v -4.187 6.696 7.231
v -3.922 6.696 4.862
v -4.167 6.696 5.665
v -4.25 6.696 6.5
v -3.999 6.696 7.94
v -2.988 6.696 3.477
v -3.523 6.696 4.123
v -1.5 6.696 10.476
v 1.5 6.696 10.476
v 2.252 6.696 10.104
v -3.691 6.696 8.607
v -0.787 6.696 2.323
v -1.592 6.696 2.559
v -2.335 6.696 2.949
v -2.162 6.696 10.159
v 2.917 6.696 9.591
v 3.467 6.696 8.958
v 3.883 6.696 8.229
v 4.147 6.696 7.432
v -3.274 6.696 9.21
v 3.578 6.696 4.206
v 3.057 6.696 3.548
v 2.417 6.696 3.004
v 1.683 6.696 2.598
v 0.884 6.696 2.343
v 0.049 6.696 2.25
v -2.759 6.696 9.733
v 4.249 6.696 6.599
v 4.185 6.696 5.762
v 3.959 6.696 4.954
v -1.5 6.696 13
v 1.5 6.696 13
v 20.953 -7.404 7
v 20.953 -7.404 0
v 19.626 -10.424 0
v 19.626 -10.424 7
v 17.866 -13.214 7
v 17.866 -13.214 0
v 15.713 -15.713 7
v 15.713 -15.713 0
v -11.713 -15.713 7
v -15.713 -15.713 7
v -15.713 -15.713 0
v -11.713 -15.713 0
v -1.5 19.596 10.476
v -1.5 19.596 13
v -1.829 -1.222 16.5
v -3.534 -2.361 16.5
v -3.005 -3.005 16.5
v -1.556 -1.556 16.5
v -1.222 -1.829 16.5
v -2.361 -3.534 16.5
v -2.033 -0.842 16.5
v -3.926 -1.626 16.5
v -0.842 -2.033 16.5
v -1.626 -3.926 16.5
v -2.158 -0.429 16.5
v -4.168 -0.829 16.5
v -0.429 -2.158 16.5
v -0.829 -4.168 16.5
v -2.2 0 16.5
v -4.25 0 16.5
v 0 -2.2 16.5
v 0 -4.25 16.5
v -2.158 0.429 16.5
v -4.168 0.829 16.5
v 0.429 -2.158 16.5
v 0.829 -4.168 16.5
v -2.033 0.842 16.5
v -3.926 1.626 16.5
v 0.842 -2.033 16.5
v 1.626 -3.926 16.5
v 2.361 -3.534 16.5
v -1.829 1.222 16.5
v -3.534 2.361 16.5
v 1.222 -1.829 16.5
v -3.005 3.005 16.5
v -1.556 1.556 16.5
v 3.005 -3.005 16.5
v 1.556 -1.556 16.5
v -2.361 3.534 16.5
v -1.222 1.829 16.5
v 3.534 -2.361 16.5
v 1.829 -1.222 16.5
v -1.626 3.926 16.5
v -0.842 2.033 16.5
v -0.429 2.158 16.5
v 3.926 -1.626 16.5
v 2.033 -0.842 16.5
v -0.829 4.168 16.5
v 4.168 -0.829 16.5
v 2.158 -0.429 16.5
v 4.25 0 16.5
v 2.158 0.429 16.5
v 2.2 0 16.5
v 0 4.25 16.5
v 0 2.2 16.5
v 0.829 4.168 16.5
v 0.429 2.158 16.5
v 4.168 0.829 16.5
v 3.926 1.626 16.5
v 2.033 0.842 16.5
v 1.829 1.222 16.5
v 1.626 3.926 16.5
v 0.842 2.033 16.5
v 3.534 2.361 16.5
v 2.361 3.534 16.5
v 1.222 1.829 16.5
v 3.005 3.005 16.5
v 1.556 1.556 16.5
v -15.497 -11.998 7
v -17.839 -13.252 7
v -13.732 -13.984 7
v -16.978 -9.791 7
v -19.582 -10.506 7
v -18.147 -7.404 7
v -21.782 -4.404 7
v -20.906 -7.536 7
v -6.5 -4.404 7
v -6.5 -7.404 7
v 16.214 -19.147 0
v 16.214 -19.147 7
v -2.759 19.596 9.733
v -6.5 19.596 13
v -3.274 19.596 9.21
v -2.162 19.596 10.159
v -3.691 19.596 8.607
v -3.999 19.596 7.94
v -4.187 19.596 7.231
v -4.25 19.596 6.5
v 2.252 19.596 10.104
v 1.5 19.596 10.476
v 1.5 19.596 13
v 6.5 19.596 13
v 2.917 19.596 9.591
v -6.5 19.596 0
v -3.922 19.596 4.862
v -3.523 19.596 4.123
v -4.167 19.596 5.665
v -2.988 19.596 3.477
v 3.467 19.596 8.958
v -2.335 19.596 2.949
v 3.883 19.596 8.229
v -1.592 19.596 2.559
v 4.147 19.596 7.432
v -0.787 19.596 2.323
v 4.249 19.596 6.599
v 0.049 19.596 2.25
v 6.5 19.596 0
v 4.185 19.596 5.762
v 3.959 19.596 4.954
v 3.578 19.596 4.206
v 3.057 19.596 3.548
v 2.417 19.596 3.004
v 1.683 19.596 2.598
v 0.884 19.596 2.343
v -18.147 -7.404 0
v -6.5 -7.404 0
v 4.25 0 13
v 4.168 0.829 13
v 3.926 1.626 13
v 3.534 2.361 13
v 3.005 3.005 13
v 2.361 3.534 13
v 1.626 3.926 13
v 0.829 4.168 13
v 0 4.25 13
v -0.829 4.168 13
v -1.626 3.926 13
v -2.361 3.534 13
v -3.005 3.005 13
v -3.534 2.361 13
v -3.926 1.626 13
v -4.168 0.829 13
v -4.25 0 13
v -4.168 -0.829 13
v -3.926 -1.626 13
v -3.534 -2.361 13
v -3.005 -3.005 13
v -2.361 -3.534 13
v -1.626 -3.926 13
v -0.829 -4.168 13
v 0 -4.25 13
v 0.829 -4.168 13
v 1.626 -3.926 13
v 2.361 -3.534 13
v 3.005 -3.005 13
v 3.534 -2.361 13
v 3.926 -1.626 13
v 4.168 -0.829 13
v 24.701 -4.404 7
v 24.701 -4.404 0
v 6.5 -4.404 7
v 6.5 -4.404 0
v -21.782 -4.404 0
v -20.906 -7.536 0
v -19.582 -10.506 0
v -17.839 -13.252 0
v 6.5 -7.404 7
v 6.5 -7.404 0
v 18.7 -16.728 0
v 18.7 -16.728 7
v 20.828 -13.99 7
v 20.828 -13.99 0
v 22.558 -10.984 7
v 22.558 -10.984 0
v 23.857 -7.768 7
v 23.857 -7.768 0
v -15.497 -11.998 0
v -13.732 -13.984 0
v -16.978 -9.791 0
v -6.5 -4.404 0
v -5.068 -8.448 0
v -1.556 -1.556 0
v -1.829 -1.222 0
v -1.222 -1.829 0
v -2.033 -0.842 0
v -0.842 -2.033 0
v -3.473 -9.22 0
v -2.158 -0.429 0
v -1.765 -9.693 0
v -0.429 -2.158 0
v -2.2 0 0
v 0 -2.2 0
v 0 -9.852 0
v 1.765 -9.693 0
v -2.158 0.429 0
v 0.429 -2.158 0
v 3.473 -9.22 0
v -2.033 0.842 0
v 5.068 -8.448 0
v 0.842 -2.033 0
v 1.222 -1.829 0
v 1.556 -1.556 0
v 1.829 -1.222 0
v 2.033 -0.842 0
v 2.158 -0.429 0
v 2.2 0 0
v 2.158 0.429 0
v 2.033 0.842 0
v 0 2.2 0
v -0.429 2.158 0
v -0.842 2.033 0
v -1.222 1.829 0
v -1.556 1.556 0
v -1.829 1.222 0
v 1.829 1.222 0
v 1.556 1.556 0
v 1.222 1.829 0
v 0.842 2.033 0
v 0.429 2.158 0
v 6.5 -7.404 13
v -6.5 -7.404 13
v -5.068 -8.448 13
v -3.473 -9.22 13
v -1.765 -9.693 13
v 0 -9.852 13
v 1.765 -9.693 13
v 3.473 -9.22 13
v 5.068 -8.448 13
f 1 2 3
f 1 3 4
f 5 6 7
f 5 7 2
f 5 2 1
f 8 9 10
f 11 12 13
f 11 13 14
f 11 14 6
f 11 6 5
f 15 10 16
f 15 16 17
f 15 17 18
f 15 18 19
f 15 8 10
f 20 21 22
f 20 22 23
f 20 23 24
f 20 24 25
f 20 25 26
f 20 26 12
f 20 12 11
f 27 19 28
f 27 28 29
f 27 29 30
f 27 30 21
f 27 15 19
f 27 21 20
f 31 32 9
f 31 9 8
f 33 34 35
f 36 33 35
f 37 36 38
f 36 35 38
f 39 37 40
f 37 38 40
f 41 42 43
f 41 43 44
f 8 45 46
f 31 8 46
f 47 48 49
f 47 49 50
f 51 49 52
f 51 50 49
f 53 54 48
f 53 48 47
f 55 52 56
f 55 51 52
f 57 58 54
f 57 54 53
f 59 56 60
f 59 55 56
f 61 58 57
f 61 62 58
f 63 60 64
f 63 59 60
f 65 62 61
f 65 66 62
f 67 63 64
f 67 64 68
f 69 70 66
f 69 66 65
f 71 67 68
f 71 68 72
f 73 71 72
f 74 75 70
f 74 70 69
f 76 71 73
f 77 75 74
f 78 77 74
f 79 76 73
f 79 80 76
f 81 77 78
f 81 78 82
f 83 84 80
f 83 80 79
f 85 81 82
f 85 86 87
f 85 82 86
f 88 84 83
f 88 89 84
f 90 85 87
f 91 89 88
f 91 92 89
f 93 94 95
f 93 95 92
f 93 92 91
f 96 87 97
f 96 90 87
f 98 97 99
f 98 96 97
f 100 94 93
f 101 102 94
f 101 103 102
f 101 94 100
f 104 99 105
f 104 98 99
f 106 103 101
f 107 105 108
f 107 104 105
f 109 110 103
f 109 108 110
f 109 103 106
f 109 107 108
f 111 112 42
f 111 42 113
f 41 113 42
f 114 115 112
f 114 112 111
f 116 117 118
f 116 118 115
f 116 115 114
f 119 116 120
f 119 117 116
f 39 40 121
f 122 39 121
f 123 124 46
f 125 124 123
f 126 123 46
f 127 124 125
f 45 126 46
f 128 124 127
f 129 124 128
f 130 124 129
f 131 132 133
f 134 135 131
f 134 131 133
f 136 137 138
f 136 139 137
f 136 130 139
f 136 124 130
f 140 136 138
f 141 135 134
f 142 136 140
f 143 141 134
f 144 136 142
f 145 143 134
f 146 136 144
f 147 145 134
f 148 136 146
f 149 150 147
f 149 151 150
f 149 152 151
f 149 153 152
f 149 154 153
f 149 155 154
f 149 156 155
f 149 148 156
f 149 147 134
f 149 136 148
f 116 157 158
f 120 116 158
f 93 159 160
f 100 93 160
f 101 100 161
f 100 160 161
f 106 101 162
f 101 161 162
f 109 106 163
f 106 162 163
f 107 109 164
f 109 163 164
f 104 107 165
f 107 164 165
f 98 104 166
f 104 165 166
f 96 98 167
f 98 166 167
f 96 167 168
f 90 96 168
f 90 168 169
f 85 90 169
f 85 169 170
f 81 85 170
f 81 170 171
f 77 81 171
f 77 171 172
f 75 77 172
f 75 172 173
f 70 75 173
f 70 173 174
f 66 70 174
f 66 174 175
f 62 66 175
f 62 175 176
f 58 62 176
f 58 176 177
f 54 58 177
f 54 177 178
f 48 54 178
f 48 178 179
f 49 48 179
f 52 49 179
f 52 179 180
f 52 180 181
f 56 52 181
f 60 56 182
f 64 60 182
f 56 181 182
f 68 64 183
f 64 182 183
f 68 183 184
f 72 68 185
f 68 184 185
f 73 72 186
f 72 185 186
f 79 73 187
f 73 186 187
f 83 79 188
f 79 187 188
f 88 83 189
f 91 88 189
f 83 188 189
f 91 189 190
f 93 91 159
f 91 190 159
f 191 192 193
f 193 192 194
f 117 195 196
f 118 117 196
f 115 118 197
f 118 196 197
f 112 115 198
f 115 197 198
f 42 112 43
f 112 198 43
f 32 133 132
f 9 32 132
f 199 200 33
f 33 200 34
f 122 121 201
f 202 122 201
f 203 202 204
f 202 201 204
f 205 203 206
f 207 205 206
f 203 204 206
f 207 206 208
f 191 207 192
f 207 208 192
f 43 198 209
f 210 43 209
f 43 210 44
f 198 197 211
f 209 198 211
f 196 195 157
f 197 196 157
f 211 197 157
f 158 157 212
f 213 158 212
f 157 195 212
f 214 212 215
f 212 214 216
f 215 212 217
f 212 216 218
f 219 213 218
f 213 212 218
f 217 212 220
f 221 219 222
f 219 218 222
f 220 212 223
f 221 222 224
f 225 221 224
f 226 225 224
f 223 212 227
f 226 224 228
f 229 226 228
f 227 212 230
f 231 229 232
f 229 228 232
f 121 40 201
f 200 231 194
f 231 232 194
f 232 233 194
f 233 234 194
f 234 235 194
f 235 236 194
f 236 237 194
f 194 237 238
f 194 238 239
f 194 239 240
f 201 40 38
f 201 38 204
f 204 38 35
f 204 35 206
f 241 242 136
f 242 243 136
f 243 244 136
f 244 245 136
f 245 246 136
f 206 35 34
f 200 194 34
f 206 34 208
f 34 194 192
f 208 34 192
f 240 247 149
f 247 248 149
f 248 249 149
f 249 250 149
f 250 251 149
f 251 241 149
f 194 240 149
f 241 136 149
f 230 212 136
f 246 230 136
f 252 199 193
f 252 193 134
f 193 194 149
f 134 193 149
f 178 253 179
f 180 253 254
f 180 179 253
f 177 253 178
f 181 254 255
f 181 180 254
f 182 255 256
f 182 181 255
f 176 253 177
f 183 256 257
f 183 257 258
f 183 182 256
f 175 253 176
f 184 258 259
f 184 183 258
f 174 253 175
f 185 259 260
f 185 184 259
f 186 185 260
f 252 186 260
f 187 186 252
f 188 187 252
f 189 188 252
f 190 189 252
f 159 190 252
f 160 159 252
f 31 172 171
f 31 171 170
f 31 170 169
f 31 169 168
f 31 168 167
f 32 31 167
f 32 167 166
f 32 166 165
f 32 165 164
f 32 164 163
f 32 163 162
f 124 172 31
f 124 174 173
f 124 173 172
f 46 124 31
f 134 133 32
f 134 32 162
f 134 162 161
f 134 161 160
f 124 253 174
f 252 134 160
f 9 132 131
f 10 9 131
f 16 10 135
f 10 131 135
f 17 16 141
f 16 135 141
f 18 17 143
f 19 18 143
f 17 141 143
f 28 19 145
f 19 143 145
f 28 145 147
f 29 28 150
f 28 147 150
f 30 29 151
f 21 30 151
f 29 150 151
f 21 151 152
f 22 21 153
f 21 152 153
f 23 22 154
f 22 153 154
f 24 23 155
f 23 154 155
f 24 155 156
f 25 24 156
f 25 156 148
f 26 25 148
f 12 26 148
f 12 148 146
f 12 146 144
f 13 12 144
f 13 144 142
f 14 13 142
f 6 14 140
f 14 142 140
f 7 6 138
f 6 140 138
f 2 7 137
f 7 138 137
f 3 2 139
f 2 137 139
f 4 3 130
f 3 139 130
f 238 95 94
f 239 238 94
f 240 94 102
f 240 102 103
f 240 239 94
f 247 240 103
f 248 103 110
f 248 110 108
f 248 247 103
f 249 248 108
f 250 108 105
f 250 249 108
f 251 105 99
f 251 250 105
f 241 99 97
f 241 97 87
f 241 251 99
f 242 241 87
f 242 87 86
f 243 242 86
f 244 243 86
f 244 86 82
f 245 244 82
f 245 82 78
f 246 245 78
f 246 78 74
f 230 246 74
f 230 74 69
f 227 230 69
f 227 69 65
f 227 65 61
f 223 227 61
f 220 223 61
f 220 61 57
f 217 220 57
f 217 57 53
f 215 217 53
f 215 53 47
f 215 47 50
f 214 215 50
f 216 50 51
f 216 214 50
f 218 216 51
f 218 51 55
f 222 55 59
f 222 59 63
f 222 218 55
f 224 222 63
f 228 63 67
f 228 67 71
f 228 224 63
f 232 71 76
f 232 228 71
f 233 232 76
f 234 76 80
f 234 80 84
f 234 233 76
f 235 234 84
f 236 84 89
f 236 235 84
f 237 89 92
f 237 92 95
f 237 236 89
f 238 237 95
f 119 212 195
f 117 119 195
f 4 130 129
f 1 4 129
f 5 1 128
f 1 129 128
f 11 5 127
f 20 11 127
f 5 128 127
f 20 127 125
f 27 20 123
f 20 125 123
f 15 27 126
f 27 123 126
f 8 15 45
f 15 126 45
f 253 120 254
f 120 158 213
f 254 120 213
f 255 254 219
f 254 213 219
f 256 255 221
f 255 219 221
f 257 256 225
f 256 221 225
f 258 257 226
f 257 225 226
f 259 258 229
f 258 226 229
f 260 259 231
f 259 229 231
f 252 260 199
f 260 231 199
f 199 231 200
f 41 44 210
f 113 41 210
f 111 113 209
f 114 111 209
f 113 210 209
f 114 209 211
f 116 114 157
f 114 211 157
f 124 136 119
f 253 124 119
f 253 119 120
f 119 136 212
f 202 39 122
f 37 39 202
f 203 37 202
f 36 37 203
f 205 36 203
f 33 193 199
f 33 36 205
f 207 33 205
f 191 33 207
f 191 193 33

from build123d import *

# Parameters (mm, degrees)
F0_W     = 13
F0_H     = 24
F0_H_2   = 3
F2_DEPTH = 13
F1_R     = 2.2
F3_DEPTH = 13
F5_DEPTH = 12.9
F6_DEPTH = 7
F1_R_2   = 4.25
F7_DEPTH = 16.5


with BuildPart() as f2:
    # F0 (on Top) → F2 (new body)
    with BuildSketch(Plane.XY):
        with Locations((0, 7.5963802942)):
            Rectangle(F0_W, F0_H)
        with Locations((0, -5.9036197058)):
            Rectangle(F0_W, F0_H_2)
        with BuildLine():
            Line((6.5, -7.4036197058), (-6.5, -7.4036197058))
            ThreePointArc((-6.5, -7.4036197058), (0, -9.8520852995), (6.5, -7.4036197058))
        make_face()
    extrude(amount=F2_DEPTH)

    # F1 (on Top) → F3 (cut, through all)
    with BuildSketch(Plane.XY):
        Circle(F1_R)
    extrude(amount=F3_DEPTH, mode=Mode.SUBTRACT)

    # F4 (on face) → F5 (cut)
    with BuildSketch(Plane(origin=(0, 19.5963802942, 0), x_dir=(-1, 0, 0), z_dir=(0, 1, 0))):
        with BuildLine():
            ThreePointArc((-1.5, 10.4764934301), (-2.4173849507, 3.0044671365), (4.25, 6.5))
            ThreePointArc((4.25, 6.5), (3.4955328635, 8.9173849507), (1.5, 10.4764934301))
            ThreePointArc((1.5, 10.4764934301), (0, 10.75), (-1.5, 10.4764934301))
        make_face()
        with BuildLine():
            ThreePointArc((-1.5, 10.4764934301), (0, 10.75), (1.5, 10.4764934301))
            Line((1.5, 10.4764934301), (1.5, 13))
            Line((1.5, 13), (-1.5, 13))
            Line((-1.5, 13), (-1.5, 10.4764934301))
        make_face()
    extrude(amount=-F5_DEPTH, mode=Mode.SUBTRACT)

    # F0 (on Top) → F6 (join)
    with BuildSketch(Plane.XY):
        with BuildLine():
            Line((24.700689028, -4.4036197058), (6.5, -4.4036197058))
            Line((6.5, -4.4036197058), (6.5, -7.4036197058))
            Line((6.5, -7.4036197058), (20.9526508047, -7.4036197058))
            ThreePointArc((20.9526508047, -7.4036197058), (18.798000482, -11.8516808248), (15.7134840264, -15.7134840264))
            Line((15.7134840264, -15.7134840264), (16.2143083706, -19.1471175125))
            ThreePointArc((16.2143083706, -19.1471175125), (21.7451588848, -12.5165478486), (24.700689028, -4.4036197058))
        make_face()
        with BuildLine():
            Line((-6.5, -7.4036197058), (-6.5, -4.4036197058))
            Line((-6.5, -4.4036197058), (-21.7815356203, -4.4036197058))
            ThreePointArc((-21.7815356203, -4.4036197058), (-19.581812539, -10.5061780958), (-15.7134840264, -15.7134840264))
            Line((-15.7134840264, -15.7134840264), (-11.7134840264, -15.7134840264))
            ThreePointArc((-11.7134840264, -15.7134840264), (-15.4974944993, -11.9977894851), (-18.1467821813, -7.4036197058))
            Line((-18.1467821813, -7.4036197058), (-6.5, -7.4036197058))
        make_face()
    extrude(amount=F6_DEPTH)

    # F1 (on Top) → F7 (join)
    with BuildSketch(Plane.XY):
        Circle(F1_R_2)
        Circle(F1_R, mode=Mode.SUBTRACT)
    extrude(amount=F7_DEPTH)


solid = f2.part
